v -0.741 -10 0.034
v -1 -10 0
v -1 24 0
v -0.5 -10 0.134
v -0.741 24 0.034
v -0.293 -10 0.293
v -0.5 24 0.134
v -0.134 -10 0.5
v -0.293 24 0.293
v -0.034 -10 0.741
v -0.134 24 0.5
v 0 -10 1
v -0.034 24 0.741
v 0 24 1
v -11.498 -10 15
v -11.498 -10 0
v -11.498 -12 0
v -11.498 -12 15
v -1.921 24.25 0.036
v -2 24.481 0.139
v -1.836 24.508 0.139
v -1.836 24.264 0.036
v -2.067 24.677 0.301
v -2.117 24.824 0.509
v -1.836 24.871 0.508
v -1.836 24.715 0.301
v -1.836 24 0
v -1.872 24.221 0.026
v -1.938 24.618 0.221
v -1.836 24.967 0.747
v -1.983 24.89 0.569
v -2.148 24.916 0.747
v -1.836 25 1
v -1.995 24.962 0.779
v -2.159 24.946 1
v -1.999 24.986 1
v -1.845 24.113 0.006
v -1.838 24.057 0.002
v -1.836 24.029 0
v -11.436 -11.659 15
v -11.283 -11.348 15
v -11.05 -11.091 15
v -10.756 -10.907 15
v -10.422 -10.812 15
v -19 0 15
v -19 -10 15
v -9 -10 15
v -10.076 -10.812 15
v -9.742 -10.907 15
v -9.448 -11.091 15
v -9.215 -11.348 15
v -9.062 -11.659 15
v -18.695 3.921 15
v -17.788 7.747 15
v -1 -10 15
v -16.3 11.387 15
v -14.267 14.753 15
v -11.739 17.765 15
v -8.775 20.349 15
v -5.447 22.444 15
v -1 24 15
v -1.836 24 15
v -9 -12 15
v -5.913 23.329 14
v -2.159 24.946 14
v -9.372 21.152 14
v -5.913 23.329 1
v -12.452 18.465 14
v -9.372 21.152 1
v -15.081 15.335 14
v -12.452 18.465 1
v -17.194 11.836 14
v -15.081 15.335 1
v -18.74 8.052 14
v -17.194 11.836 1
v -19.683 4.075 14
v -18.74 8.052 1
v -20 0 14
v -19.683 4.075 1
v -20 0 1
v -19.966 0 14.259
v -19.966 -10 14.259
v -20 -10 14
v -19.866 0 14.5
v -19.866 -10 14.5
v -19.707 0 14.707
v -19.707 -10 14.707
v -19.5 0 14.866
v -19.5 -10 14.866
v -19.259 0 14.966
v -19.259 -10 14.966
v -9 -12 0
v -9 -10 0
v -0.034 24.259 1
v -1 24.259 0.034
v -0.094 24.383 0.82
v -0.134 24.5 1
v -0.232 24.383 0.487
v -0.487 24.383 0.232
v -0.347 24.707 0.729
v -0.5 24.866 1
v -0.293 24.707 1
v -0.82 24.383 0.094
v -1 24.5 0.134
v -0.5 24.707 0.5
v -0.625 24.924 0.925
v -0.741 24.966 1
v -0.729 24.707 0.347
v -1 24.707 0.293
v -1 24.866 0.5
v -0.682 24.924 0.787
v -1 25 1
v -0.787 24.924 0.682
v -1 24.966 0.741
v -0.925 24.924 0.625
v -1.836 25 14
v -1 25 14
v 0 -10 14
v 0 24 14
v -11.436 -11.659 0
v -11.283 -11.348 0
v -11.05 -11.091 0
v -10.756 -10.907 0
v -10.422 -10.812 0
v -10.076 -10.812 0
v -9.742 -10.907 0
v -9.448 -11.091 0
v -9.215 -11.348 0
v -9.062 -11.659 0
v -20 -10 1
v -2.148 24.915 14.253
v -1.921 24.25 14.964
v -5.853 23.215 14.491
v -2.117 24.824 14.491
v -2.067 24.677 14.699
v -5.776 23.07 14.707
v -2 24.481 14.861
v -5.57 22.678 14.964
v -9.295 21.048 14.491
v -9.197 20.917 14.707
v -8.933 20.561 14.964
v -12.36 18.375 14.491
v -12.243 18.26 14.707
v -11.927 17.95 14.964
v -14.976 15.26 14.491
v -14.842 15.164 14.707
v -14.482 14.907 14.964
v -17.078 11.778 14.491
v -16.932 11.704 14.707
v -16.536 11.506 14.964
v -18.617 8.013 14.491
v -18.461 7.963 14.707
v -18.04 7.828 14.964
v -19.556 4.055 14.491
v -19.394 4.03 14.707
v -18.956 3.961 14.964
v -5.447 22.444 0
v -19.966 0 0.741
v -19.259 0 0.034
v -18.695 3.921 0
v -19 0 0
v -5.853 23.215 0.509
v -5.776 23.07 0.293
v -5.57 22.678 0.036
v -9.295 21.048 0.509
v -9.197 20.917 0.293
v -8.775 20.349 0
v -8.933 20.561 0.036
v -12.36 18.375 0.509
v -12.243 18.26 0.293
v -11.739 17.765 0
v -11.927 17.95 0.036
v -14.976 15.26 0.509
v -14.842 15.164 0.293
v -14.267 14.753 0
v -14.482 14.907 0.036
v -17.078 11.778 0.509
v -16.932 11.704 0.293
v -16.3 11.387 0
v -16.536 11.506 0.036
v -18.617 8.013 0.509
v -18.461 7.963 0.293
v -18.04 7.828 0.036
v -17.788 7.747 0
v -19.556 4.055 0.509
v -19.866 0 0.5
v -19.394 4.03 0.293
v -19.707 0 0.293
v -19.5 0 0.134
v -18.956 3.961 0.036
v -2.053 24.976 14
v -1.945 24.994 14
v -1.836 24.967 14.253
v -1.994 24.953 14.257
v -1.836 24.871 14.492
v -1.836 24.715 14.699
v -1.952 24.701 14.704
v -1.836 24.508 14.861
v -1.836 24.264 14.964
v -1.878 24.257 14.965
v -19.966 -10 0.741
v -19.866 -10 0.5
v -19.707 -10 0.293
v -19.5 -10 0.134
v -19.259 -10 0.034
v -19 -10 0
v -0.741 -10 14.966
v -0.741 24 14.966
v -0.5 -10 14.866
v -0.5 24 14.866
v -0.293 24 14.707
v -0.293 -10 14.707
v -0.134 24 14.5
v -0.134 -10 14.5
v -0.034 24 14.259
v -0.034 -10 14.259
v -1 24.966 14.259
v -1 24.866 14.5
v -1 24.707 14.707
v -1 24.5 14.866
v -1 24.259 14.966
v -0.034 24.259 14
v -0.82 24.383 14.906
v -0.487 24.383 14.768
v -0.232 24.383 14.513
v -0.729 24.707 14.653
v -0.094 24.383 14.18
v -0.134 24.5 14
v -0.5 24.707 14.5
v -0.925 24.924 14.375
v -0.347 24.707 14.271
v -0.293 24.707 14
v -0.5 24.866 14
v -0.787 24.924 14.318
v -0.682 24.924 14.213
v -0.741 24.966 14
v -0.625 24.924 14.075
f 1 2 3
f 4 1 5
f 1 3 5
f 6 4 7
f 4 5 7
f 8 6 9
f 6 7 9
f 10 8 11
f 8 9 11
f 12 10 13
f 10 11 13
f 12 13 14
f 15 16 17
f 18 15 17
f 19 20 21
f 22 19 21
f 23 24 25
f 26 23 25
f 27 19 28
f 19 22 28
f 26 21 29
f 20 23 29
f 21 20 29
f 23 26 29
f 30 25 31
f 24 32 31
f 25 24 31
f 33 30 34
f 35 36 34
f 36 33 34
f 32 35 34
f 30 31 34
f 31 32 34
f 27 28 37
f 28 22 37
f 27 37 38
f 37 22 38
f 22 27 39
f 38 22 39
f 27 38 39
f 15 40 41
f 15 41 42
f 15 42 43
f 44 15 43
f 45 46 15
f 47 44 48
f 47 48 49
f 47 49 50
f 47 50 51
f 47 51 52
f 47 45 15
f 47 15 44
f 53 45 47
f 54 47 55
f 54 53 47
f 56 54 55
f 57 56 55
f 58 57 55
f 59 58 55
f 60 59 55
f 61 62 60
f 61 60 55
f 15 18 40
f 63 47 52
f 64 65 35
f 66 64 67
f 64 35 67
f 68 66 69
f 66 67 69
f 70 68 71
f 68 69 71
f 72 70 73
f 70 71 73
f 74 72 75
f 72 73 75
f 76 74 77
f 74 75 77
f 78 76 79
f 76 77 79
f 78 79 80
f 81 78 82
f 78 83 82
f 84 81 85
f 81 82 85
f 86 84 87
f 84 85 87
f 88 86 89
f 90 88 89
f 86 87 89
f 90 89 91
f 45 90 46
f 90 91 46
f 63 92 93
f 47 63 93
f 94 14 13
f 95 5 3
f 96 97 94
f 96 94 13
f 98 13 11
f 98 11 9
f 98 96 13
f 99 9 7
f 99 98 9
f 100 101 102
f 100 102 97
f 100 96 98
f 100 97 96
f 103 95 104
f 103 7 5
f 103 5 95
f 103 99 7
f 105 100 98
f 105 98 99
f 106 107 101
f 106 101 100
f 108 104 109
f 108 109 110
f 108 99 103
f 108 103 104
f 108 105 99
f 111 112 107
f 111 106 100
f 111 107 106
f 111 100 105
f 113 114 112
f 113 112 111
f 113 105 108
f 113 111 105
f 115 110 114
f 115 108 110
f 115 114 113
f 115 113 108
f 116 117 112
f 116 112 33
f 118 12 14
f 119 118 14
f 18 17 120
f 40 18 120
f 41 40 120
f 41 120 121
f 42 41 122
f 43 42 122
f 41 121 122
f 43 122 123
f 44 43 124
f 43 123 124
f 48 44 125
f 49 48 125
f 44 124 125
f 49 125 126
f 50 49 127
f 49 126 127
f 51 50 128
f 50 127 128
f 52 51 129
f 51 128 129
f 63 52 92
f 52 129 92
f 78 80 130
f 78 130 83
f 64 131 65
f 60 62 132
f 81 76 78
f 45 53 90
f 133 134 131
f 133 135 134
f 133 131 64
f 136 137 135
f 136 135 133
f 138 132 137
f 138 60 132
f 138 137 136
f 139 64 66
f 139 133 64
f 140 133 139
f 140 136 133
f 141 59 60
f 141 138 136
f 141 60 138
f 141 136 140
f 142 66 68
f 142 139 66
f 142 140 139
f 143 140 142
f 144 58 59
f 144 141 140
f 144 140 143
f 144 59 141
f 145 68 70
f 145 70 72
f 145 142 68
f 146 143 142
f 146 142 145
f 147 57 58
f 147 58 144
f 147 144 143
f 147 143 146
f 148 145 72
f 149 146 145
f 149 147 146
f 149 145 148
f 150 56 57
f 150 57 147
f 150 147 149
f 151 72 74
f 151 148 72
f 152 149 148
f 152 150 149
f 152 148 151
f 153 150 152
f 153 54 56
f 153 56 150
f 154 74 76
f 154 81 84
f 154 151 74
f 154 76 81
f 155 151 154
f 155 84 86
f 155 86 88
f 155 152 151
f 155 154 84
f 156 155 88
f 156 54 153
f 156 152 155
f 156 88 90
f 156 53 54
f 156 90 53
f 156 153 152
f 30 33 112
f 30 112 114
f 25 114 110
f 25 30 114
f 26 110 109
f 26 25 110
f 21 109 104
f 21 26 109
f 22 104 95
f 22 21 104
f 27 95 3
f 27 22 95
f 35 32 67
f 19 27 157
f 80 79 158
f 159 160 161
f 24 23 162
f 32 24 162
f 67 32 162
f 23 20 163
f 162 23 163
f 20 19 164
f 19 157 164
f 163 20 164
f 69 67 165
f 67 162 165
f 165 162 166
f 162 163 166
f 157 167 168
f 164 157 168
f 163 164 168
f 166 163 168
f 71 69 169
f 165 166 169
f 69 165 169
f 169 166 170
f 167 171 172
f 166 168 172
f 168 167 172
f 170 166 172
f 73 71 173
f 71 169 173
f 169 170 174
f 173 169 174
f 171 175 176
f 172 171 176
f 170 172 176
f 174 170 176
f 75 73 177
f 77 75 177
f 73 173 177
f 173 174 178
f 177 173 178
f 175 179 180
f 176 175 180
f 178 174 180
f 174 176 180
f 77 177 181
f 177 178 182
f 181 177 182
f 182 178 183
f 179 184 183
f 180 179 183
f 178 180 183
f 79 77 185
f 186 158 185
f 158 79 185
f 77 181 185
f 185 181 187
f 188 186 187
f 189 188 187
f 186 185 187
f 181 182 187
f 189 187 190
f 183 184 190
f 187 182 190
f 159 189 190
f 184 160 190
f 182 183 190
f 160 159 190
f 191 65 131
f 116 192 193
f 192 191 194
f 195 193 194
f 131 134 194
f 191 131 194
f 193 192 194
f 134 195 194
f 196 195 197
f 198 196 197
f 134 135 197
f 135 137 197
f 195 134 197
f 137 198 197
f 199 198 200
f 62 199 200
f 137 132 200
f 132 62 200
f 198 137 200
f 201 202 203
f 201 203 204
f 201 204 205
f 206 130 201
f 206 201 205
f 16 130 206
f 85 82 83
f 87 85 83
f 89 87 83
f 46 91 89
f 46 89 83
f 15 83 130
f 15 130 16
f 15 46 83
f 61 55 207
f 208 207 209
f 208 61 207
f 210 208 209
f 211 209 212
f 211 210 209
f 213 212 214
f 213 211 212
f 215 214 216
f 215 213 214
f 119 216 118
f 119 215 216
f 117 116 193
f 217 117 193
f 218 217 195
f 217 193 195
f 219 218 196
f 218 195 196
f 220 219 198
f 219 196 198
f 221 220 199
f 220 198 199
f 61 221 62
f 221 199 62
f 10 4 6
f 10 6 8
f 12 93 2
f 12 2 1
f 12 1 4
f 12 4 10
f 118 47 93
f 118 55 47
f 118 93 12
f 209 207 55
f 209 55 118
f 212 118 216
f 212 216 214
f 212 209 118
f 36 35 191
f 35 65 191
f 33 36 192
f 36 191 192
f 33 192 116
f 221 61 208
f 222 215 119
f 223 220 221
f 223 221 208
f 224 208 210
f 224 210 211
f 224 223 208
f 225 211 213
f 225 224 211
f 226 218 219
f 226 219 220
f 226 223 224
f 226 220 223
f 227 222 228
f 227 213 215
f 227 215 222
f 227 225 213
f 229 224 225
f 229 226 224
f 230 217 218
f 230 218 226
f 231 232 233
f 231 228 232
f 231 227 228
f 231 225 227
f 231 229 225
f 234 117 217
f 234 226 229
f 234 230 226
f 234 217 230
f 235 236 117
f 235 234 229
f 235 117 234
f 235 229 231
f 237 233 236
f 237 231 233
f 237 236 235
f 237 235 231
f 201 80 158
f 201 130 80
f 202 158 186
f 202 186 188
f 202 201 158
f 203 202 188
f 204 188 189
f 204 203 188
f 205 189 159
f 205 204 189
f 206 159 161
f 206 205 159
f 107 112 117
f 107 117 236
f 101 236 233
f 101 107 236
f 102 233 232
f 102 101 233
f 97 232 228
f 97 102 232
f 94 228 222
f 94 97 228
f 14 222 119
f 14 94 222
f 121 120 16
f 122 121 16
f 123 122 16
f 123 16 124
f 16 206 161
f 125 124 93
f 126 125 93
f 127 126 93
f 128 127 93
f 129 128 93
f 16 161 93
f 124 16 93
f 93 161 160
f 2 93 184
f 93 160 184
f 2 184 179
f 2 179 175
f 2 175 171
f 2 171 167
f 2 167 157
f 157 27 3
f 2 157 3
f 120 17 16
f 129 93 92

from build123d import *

# Parameters (mm, degrees)
F0_W         = 20
F0_H         = 15
F1_DEPTH     = 10
F2_R         = 1
F4_DEPTH     = 15
F5_T1_DEPTH  = 30
F5_T3_DEPTH  = 8.75
F5_T6_ANGLE  = 80.7474763736
F5_T8_ANGLE  = 80.7474763736
F6_R         = 1
F7_T1_DEPTH  = 13
F7_S5_W      = 1
F7_S5_H      = 1
F7_T6_DEPTH  = 1
F7_S11_W     = 1
F7_S11_H     = 1
F7_T12_DEPTH = 1
F9_DEPTH     = 15


# Not quite as in the source:
# - a fillet or chamfer that OpenCascade refuses, or shapes differently, is made with other operations: its cross-section is extruded or revolved along the edge and cut away or added


with BuildPart() as f1:
    # F0 (on Front) → F1 (new body)
    with BuildSketch(Plane.XZ):
        with Locations((-10, 7.5)):
            Rectangle(F0_W, F0_H)
    extrude(amount=F1_DEPTH)

    # F2
    f2_edges = [f1.edges().sort_by_distance(p)[0] for p in [
        (-20, -5, 15),
        (0, -5, 15),
        (-20, -5, 0),
        (0, -5, 0),
    ]]
    fillet(f2_edges, radius=F2_R)

    # F3 (on Top) → F4 (join)
    with BuildSketch(Plane.XY):
        with BuildLine():
            Line((-20, 0), (0, 0))
            Line((0, 0), (0, 25))
            Line((0, 25), (-2, 25))
            ThreePointArc((-2, 25), (-15.0318358344, 15.4029218007), (-20, 0))
        make_face()
    extrude(amount=F4_DEPTH)

    # F5: fillet of radius 1 on 6 edges, made by hand

    # F5_s2 → F5_t1 (cut)
    with BuildSketch(Plane.XZ.offset(-27.5)):
        with BuildLine():
            ThreePointArc((-1, 15), (-0.2928932188, 14.7071067812), (0, 14))
            Line((0, 14), (0, 15))
            Line((0, 15), (-1, 15))
        make_face()
        with BuildLine():
            ThreePointArc((-1, 0), (-0.2928932188, 0.2928932188), (0, 1))
            Line((0, 1), (0, 0))
            Line((0, 0), (-1, 0))
        make_face()
    extrude(amount=F5_T1_DEPTH, mode=Mode.SUBTRACT)

    # F5_s4 → F5_t3 (cut)
    with BuildSketch(Plane.YZ.offset(-6.25)):
        with BuildLine():
            ThreePointArc((25, 14), (24.7071067812, 14.7071067812), (24, 15))
            Line((24, 15), (25, 15))
            Line((25, 15), (25, 14))
        make_face()
        with BuildLine():
            ThreePointArc((25, 1), (24.7071067812, 0.2928932188), (24, 0))
            Line((24, 0), (25, 0))
            Line((25, 0), (25, 1))
        make_face()
    extrude(amount=F5_T3_DEPTH, mode=Mode.SUBTRACT)

    # F5_s5 → F5_t6 (revolve, cut)
    with BuildSketch(Plane(origin=(6.1966627118, 1.0094707841, 0), x_dir=(0, 0, 1), z_dir=(0.9869892856, 0.1607860383, 0))):
        with BuildLine():
            ThreePointArc((14, -25.3383332565), (14.7071067812, -25.0454400377), (15, -24.3383332565))
            Line((15, -24.3383332565), (15, -25.3383332565))
            Line((15, -25.3383332565), (14, -25.3383332565))
        make_face()
    revolve(axis=Axis((6.3611111111, 0, 15), (0, 0, 1)), revolution_arc=F5_T6_ANGLE, mode=Mode.SUBTRACT)

    # F5_s7 → F5_t8 (revolve, cut)
    with BuildSketch(Plane(origin=(6.1966627118, 1.0094707841, 0), x_dir=(0, 0, 1), z_dir=(0.9869892856, 0.1607860383, 0))):
        with BuildLine():
            ThreePointArc((1, -25.3383332565), (0.2928932188, -25.0454400377), (0, -24.3383332565))
            Line((0, -24.3383332565), (0, -25.3383332565))
            Line((0, -25.3383332565), (1, -25.3383332565))
        make_face()
    revolve(axis=Axis((6.3611111111, 0, 0), (0, 0, 1)), revolution_arc=F5_T8_ANGLE, mode=Mode.SUBTRACT)

    # F6
    f6_edges = [f1.edges().sort_by_distance(p)[0] for p in [
        (-2, 25, 7.5),
    ]]
    fillet(f6_edges, radius=F6_R)

    # F7: fillet of radius 1 on 1 edges, made by hand

    # F7_s2 → F7_t1 (cut)
    with BuildSketch(Plane.XY.offset(1)):
        with BuildLine():
            ThreePointArc((-1, 25), (-0.2928932188, 24.7071067812), (0, 24))
            Line((0, 24), (0, 25))
            Line((0, 25), (-1, 25))
        make_face()
    extrude(amount=F7_T1_DEPTH, mode=Mode.SUBTRACT)


with BuildPart() as f7_tool4:
    # F7_s5 → F7_t6 (new body)
    with BuildSketch(Plane.XZ.offset(-24)):
        with Locations((-0.5, 0.5)):
            Rectangle(F7_S5_W, F7_S5_H)
    extrude(amount=-F7_T6_DEPTH)

    # F7_s7 → F7_t8 (revolve, cut)
    with BuildSketch(Plane(origin=(-1, 24, 1), x_dir=(-0.7071067812, 0, 0.7071067812), z_dir=(-0.7071067812, 0, -0.7071067812))):
        with BuildLine():
            ThreePointArc((0, -1), (1, 0), (0, 1))
            Line((0, 1), (0, -1))
        make_face()
    revolve(axis=Axis((-1, 24, 1), (0, 1, 0)), mode=Mode.SUBTRACT)


with BuildPart() as f1_1:
    add(f1.part)

    # F7_t3: cut F7_tool4
    add(f7_tool4.part, mode=Mode.SUBTRACT)


with BuildPart() as f7_tool10:
    # F7_s11 → F7_t12 (new body)
    with BuildSketch(Plane.XZ.offset(-24)):
        with Locations((-0.5, 14.5)):
            Rectangle(F7_S11_W, F7_S11_H)
    extrude(amount=-F7_T12_DEPTH)

    # F7_s13 → F7_t14 (revolve, cut)
    with BuildSketch(Plane(origin=(-1, 24, 14), x_dir=(-0.7071067812, 0, -0.7071067812), z_dir=(0.7071067812, 0, -0.7071067812))):
        with BuildLine():
            ThreePointArc((0, -1), (1, 0), (0, 1))
            Line((0, 1), (0, -1))
        make_face()
    revolve(axis=Axis((-1, 24, 14), (0, 1, 0)), mode=Mode.SUBTRACT)


with BuildPart() as f1_2:
    add(f1_1.part)

    # F7_t9: cut F7_tool10
    add(f7_tool10.part, mode=Mode.SUBTRACT)

    # F8 (on Top) → F9 (join, through all)
    with BuildSketch(Plane.XY):
        with BuildLine():
            Line((-9, -10), (-11.4979991994, -10))
            Line((-11.4979991994, -10), (-11.4979991994, -12))
            ThreePointArc((-11.4979991994, -12), (-10.2489995997, -10.8), (-9, -12))
            Line((-9, -12), (-9, -10))
        make_face()
    extrude(amount=F9_DEPTH)


solid = f1_2.part
